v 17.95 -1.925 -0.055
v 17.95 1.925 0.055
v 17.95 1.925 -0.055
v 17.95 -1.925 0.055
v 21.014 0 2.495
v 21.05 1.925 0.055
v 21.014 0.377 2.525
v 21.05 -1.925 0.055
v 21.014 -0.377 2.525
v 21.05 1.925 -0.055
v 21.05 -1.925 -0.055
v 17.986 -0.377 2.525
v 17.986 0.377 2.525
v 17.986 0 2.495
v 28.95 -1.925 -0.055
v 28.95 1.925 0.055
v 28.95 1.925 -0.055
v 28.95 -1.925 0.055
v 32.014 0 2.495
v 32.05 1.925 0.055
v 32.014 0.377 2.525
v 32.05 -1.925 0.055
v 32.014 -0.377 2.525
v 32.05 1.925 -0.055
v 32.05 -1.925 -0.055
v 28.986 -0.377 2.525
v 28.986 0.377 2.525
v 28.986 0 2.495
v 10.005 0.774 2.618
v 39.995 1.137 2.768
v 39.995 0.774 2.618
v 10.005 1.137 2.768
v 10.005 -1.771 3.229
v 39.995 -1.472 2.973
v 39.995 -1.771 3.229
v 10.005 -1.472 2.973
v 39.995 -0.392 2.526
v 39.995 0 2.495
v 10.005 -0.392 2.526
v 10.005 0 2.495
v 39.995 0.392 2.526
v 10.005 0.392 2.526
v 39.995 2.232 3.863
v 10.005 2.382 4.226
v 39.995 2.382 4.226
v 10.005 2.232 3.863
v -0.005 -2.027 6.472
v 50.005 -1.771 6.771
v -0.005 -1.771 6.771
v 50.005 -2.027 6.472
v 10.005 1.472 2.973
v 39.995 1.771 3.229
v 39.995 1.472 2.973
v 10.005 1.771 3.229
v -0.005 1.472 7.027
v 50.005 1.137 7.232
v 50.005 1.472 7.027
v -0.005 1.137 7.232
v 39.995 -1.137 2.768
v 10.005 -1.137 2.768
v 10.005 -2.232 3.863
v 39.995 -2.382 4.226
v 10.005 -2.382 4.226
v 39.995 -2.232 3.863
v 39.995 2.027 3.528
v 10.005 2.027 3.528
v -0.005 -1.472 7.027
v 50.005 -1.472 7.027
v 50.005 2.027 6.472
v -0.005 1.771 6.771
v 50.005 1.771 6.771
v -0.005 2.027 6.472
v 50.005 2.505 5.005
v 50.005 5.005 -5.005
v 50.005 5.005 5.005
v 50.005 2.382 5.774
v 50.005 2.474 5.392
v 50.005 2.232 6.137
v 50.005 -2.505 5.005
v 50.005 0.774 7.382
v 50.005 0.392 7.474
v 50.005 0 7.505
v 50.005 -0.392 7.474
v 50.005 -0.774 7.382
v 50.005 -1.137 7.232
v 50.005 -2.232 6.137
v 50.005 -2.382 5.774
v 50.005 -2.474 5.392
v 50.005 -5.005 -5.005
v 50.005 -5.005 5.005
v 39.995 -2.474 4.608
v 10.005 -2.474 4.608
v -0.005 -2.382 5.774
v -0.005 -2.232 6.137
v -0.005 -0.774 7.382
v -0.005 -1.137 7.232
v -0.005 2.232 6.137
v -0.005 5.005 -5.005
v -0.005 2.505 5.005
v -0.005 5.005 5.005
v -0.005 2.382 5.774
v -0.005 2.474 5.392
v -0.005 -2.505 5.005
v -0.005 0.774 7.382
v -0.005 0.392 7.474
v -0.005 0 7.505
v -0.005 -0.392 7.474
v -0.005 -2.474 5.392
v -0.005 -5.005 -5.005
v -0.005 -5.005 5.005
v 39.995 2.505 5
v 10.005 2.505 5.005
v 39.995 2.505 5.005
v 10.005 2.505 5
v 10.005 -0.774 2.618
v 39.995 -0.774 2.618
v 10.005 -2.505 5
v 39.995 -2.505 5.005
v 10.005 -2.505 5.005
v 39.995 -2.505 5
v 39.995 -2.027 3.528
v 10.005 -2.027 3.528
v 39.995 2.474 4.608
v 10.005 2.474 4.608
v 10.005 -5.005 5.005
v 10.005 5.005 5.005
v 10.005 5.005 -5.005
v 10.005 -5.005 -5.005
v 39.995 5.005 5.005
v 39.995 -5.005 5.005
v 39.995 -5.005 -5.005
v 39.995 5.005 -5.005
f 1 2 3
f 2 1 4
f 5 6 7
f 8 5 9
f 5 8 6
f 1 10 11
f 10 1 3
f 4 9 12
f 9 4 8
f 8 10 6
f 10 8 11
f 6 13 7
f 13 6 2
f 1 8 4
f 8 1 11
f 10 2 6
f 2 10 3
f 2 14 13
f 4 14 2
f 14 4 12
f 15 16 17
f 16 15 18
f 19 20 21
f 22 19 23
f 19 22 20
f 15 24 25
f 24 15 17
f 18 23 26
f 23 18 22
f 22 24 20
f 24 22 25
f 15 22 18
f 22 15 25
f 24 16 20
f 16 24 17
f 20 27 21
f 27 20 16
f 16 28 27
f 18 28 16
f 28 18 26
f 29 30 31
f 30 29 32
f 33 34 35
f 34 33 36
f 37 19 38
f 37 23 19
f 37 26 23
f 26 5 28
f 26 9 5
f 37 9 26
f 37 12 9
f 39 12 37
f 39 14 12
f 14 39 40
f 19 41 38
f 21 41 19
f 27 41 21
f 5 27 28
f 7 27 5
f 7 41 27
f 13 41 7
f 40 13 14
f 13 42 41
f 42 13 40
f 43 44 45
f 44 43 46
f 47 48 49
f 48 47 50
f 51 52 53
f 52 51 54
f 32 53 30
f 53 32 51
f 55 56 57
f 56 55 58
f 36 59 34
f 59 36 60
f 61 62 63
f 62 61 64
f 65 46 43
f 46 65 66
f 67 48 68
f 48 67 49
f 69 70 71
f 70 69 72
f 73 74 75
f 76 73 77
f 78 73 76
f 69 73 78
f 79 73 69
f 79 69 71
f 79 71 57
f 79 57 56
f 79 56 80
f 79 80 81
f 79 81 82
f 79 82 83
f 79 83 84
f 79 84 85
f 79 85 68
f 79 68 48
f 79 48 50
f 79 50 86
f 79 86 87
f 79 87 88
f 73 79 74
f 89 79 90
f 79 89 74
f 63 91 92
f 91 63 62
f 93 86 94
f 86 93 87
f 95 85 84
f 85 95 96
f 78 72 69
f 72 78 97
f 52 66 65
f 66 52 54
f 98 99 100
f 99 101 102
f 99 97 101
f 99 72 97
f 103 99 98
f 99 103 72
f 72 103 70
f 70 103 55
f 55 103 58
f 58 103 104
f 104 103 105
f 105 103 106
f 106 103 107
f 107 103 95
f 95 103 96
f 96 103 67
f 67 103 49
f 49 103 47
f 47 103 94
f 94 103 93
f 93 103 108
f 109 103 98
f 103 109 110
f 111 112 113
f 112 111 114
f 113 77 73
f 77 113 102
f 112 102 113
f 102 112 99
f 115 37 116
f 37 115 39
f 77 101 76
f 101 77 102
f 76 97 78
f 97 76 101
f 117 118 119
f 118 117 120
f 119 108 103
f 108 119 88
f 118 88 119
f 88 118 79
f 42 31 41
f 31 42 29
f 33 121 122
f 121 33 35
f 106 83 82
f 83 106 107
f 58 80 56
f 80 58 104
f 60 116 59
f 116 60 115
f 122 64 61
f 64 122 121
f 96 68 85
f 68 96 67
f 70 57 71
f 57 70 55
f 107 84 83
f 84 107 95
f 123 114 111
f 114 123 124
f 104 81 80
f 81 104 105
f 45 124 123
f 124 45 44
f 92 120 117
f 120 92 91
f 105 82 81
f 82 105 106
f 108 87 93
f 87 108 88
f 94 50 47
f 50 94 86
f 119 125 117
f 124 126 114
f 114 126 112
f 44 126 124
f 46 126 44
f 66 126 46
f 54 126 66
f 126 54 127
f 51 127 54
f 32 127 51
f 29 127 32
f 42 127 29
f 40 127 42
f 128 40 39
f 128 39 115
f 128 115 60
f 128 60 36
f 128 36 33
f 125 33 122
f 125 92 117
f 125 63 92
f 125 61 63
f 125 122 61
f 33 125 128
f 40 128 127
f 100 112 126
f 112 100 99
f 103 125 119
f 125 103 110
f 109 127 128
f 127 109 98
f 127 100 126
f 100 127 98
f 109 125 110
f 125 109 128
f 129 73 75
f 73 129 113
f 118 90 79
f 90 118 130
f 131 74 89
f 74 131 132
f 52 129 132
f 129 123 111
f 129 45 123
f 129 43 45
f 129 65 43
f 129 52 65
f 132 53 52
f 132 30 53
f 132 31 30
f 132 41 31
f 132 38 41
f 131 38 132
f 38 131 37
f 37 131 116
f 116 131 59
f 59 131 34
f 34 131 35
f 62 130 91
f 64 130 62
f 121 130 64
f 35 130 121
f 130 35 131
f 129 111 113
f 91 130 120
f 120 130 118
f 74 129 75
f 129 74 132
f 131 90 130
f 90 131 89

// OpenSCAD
// file: vector_operations.scad
/*

    Make up for the lack of common vector operations.

    Usage:

        use <vector_operations.scad>

*/

module end_of_customization() {}

show_name = false;
if (show_name) {
    linear_extrude(2) text("vector_operations.scad", halign="center");
}

function quicksort(arr) = !(len(arr)>0) ? [] : let(
    pivot   = arr[floor(len(arr)/2)],
    lesser  = [ for (y = arr) if (y  < pivot) y ],
    equal   = [ for (y = arr) if (y == pivot) y ],
    greater = [ for (y = arr) if (y  > pivot) y ]
) concat(
    quicksort(lesser), equal, quicksort(greater)
);

// Cumulative sum of values in v
function v_cumsum(v) = [for (a = v[0]-v[0], i = 0; i < len(v); a = a+v[i], i = i+1) a+v[i]];
    
function v_sum(v, i=0, r=0) = i<len(v) ? v_sum(v, i+1, r+v[i]) : r;

function v_add_scalar(v, s) = [ for (e = v) e + s ];
    
function v_sub_scalar(v, s) = [ for (e = v) e - s ];
    
function v_mul_scalar(v, s) = [ for (e = v) e * s ];

function v_set(v) = let(sv = quicksort(v)) [for (i = [0: 1 : len(v)-1 ]) if (i == 0) sv[i] else if (sv[i] != sv[i-1]) sv[i]];

function v_shorten(v, places) = [ for (idx = [0 : 1: places-1]) v[idx]];

// The add operation is reasonably as the + operator in the language itself. 
 

function a2_add_scalar(a, s) = [ for (ae = a) v_add_scalar(ae, s) ];

// Array should be rectangular, with the same number
// of elements in each contained list.  
// That makes it different from a generic C style lists of list.
function array_transpose(a) = 
    [ for (j = [0 : 1 : len(a[0])-1]) 
        [ for (i =[0 : 1 : len(a)-1])
          a[i][j]  
        ]
    ];
        
        
module test_array_transpose() {
    a = [["cat1", "dog1"],
         ["cat2", "dog2"]]; 
    * echo("a", a);
    * echo("aT", array_transpose(a));
}

* test_array_transpose();

//Hadamard Product - - a & b must be same dimensioon
function v_o_dot(v_a, v_b) = 
    assert(len(v_a) == len(v_b), str("len(v_a)=", len(v_a), "len(v_b)=", len(v_b)))
    [ for (i = [0 : len(v_a)-1]) v_a[i] * v_b[i] ];


         
// file: centerable.scad
use <vector_operations.scad>


function bw_lshift(number, places) = 
    number * pow(2, places);
    
function bw_rshift(number, places) = 
    floor(number / pow(2, places));
    
function bw_extract(number, places, bits) = 
    bw_rshift(number, places) % pow(2, bits);

// A bit less brain-damaged primative shapes

CENTER = 0;   
PLUS = 1;
MINUS = 2;

FRONT = 1;
BEHIND = 2; 
RIGHT = 4;
LEFT =  8;    
ABOVE = 16;
BELOW = 32;
SIDEWISE = 64;

_X_BITS = [0, 2];
_Y_BITS = [2, 2];
_Z_BITS = [4, 2];
_O_BITS = [6, 1];

_XYZO_BITMAP = [_X_BITS, _Y_BITS, _Z_BITS, _O_BITS];

function _number_to_bitvector(number) = [ 
    for (i = [0:3]) let(places = _XYZO_BITMAP[i][0], bits = _XYZO_BITMAP[i][1]) 
       bw_extract(number, places, bits) 
];
    

function _bv_to_sign(bv) = [
    for (i = [0:len(bv)]) 
        bv[i] == PLUS ? 1 :
        bv[i] == MINUS ? -1 : 0
];
    

function _center_to_dv(center, s, bv) = [
    for (i = [0:len(s)-1]) s[i] * bv[i]
];
    
function _center_to_displacement(center, size) = 
    _center_to_dv(
        center, 
        v_mul_scalar(size, 0.5),
        _bv_to_sign(_number_to_bitvector(center))); 

function _rotation_to_angles(angles) = 
    let(
         bv = v_shorten(_number_to_bitvector(angles), 3),
         signs = _bv_to_sign(bv),
         // signs = [FRONT|BEHIND, RIGHT|LEFT, ABOVE|BELOW]
         // A sign of zero for FRONT|BEHIND is treated as FRONT
         rotation = 
            [0, 0, signs[0] == 1 ? 0 :  signs[0] == -1 ? 180: 0] + 
            v_mul_scalar([0, 0, 90], signs[1]) + 
            v_mul_scalar([0, -90, 0], signs[2])
    )
    rotation;

module center_translation(size, center) {
    disp = _center_to_displacement(center, size);
    translate(disp) { 
        children();
    }
}

module center_rotation(rotation) {
    angles = _rotation_to_angles(rotation);
    rotate(angles) {
        children();
    }

}


module center_reflect(v) {
    assert(!is_undef(v), "You must pass an mirroring argument to center_reflect()");
    children();
    mirror(v) children();
}
  
// main file
/*

    The shapes are slightly oversized, and the placement adjusted
    so that two shapes placed next to each other will have 
    non-adjacent faces. Shaped can be ranked, so that if the
    overlap, it is definite which will win the z-ordering fight.

    This is an attempt to make the epsilon  
*/



include <centerable.scad>

/* [Boiler Plate] */

$fa = 1;
$fs = 0.4;
eps = 0.005;
infintesimal = 0.01;

/* [Visual Tests] */

show_test_rod_all_octants = false;
show_test_rod_rod_single_attribute = false;
show_visual_test_for_crank = false;
show_visual_test_for_rod_support = true;
 

// h_by_one_hundred = 1; // [0 : 1 : 99.9]
// echo("h_by_one_hundred", h_by_one_hundred);
__l = 50; // [0 : 1 : 99.9]
//echo(__l);
__x_start = 10; // [0 : 1 : 99.9]
__x_stop = 40; // [0 : 1 : 99.9]
__support_end_start  = true;
__support_end_stop  = true;
__ends_supported = [__support_end_start, __support_end_stop];
/* 
    Block is a cube with a specific translation about the origin.

    
    Example usage:
    
    size = [10, 2, 6];
    cuboid(size); // Centered on X, Y, & Z axises
    
    block(size, center=ABOVE); // Centered on X, Y axises
    block(size, center=ABOVE+FRONT); // Centered on X
    block(size, center=ABOVE+FRONT+LEFT); // One corner is at origin
    
*/
module block(size, center=0, rank=1) { 
    function swell(w=0) = w + 2*rank*eps;
    true_size = size + [swell(0), swell(0), swell(0)];
    disp = _center_to_displacement(center, size);
    translate(disp) cube(true_size, center=true);  
}



/*
    Rod is a cylinder on its edge, with a specific translation 
    about the origin and orientation.

    Example usage:

    rod(d=10, l=20, center = FRONT);
    rod(d=10, l=20, center = SIDEWISE + FRONT + ABOVE + LEFT);

*/

module rod(d, l, center=0, hollow=false, rank=1, fa=undef) {
    function swell(w=0) = w + 2*rank*eps;
    function swell_inward(w=0) = w - 2*rank*eps;  
    $fa = is_undef(fa) ? $fa : fa;
    bv = _number_to_bitvector(center);
    is_sideways = bv[3] == 1;
    x = is_sideways ? d : l;
    y = is_sideways ? l : d;
    z = d;
    size=[x, y, z];
    disp = _center_to_displacement(center, size);
    a = is_sideways ? 90 : 0;


    translate(disp) {
        rotate([0, 0, a])
        rotate([0, 90, 0])
        if (hollow == false) {
            cylinder(d=swell(d), h=swell(l), center=true);
        } else if (is_num(hollow)) {
            render() difference() {
                cylinder(d=swell(d), h=swell(l), center=true);
                cylinder(d=swell_inward(hollow), h=2*l, center=true);  
            }
        } else {
            assert(false, str("Don't know how to handle hollow=", hollow));
        } 
    }   
}

/*
    Can  is a cylinder on its end, with a specific translation 
    about the origin.
    
*/
module can(d,h, center=0, hollow=false, taper=false, rank=1, fa=undef) {
    function swell(w=0) = w + 2*rank*eps;
    function swell_inward(w=0) = w - 2*rank*eps; 
    $fa = is_undef(fa) ? $fa : fa;
    bv = _number_to_bitvector(center);
    size = [d, d, h];
    disp = _center_to_displacement(center, size);
    translate(disp) {
        if (hollow == false) {
            if (taper == false) {
                cylinder(d=swell(d), h=swell(h), center=true); 
            } else if (is_num(taper)) {
                cylinder(d1=swell(d), d2=swell(taper), h=swell(h), center=true);
            } else {
                assert(false, str("Don't know how to handle taper=", taper));
            }
        } else if (is_num(hollow)) {
            if (taper == false) {
                render() difference() {
                    cylinder(d=swell(d), h=swell(h), center=true);
                    cylinder(d=swell_inward(hollow), h=2*h, center=true);
                }
            } else {
                assert(false, "Not implemented - hollow tapered.");
            }
        } else {
            assert(false, str("Don't know how to handle hollow=", hollow));
        }  
    }  
}

module crank(size, hole=false, center=0, rotation=0, rank=1, fa=undef) {
    function swell(w=0) = w + 2*rank*eps;
    function swell_inward(w=0) = w - 2*rank*eps; 
    $fa = is_undef(fa) ? $fa : fa;
    hole_d = is_num(hole) ? hole : 0;
    pivot_size = [size.z, size.y, size.z];
    half_pivot = [swell(pivot_size.x/2),  swell(pivot_size.y), swell(pivot_size.z)];
    remainder =  [swell(size.x - pivot_size.x/2), swell(size.y), swell(size.z)];

    center_translation(pivot_size, center) {
        center_rotation(rotation) {
            render() difference() {
                union() {
                    block(half_pivot, center=FRONT);
                    rod(d=swell(size.z), l=swell(size.y), center=SIDEWISE);
                }
                rod(d=swell_inward(hole_d), l=2*size.y, center=SIDEWISE);
            }
            // Rest of block
            translate([pivot_size.x/2, 0, 0]) block(remainder, center=FRONT);
        }
    } 
}

module tearaway(
        support_locations, 
        d,
        l,
        z,
        center=0,
        radial_allowance=0.4, 
        overlap_multiplier=1.5,
        support_length=3) {
           
    x_offset = center==0 ? -l/2:
               center==FRONT ? 0:
               assert(false);
    z_p = z - d / 2;
    base = [support_length, 1.5*z_p, , infintesimal];
    neck = [support_length, infintesimal, infintesimal];
    z_neck = z_p + overlap_multiplier*radial_allowance;
    
    module tearaway_segment(ts_center) {
        hull() {
           block(base, center=ts_center, rank=10);
           translate([0, 0, z_neck]) block(neck, center=ts_center);
        }
    }
    for (support_location = support_locations) {
        dx = is_num(support_location) ? support_location : support_location[0];
        ts_center = is_num(support_location) ? center : support_location[1];
        translate([dx+x_offset, 0, 0]) tearaway_segment(ts_center);
    } 
} 

module _visual_test_for_crank() {

    translate([0, -80, 0]) crank([10, 4, 4], hole=2, center=BEHIND);

    translate([0, -70, 0]) crank([10, 4, 4], hole=2, center=FRONT);

    translate([0, -60, 0]) crank([10, 4, 4], hole=2, center=LEFT);

    translate([0, -50, 0]) crank([10, 4, 4], hole=2, center=RIGHT);

    translate([0, -40, 0]) crank([10, 4, 4], hole=2, center=ABOVE);

    translate([0, -30, 0]) crank([10, 4, 4], hole=2, center=BELOW);

    translate([0, -10, 0]) crank([10, 4, 4]);

    translate([0, 0, 0]) crank([10, 4, 4], hole=2);

    translate([0, 20, 0]) crank([10, 4, 4], hole=2, rotation=ABOVE);

    translate([0, 30, 0]) crank([10, 4, 4], hole=2, rotation=BELOW);

    translate([0, 40, 0]) crank([10, 4, 4], hole=2, rotation=FRONT);

    translate([0, 50, 0]) crank([10, 4, 4], hole=2, rotation=BEHIND);

    translate([0, 70, 0]) crank([10, 4, 4], hole=2, rotation=LEFT);

    translate([0, 80, 0]) crank([10, 4, 4], hole=2, rotation=RIGHT);

    translate([0, 100, 0]) crank([10, 4, 4], hole=2, rotation=ABOVE+RIGHT);
    
}

if (show_visual_test_for_crank) {
    _visual_test_for_crank();   
}


module _visual_test_rod_single_attribute(d, l, a) {
    
    color("SteelBlue", alpha = a) 
    rod(d=d, l=l, center=BEHIND); 

    color("FireBrick", alpha = a) 
    rod(d=d, l=l, center=FRONT);

    color("Lavender", alpha = a)   
    rod(d=d, l=l, center=LEFT);

    color("RosyBrown", alpha = a)        
    rod(d=d, l=l, center=RIGHT);

    color("Aqua", alpha = a)   
    rod(d=d, l=l, center=ABOVE);

    color("blue", alpha = a)        
    rod(d=d, l=l, center=BELOW);
}

if (show_test_rod_rod_single_attribute) {
    _visual_test_rod_single_attribute(10, 20, 0.5);
}

module _visual_test_all_octants(d, l, use_sideways, alpha) {
    colors = [
        [
            ["red", "orange"],
            ["yellow", "green"]
        ],
        [
            ["IndianRed", "LightSalmon"],
            ["Khaki", "LightGreen"]
        ]
    ];
    a_sideways = use_sideways ? SIDEWISE : 0;
    
    function i_x(x) = x == BEHIND ? 0 : 1;
    function i_y(y) = y == LEFT ? 0 : 1;
    function i_z(z) = z == ABOVE ? 0 : 1;
    
    function map_to_color(x, y, z) = colors[i_x(x)][i_y(y)][i_z(z)];
    for (x_a = [BEHIND, FRONT]) {
        for (y_a = [LEFT, RIGHT]) {
            for (z_a = [ABOVE, BELOW]) {
                color(map_to_color(x_a, y_a, z_a), alpha=alpha)        
                rod(d=d, l=l, center=x_a+y_a+z_a+a_sideways);                
            }
        }
    }
    
}

if (show_test_rod_all_octants) {
    _visual_test_all_octants(10, 20, false, 0.5);
}
        
function support_locations_for_segment(
        segment, 
        ends_supported = [true, true],
        support_length = 3, 
        max_bridge = 10) =
    let(
        segment_length = abs(segment[0] - segment[1]),
        n_end_bridges = (ends_supported[0] ? 1 : 0) + (ends_supported[1] ? 1 : 0),
        n_supports_fractional = 
            (segment_length - (n_end_bridges - 1) * max_bridge) / (support_length + max_bridge),
        n_supports = ceil(n_supports_fractional),
        n_bridges = n_supports + n_end_bridges - 1, 
        bridge = (segment_length - n_supports*support_length)/n_bridges,
        last = undef
    )
    echo("segment_length", segment_length)
    echo("n_end_bridges", n_end_bridges)
    echo("n_supports_fractional", n_supports_fractional)
    echo("n_supports", n_supports)
    echo("n_bridges", n_bridges)
    echo("bridge", bridge)
    assert(bridge <= max_bridge)
    [
        for (i = [0 : 1 : n_supports-1])  
            segment[0] 
            + (ends_supported[0] ? bridge: 0)
            + i * (support_length + bridge)
    ];

module _visual_test_for_rod_support() {
    z = 5;
    d = 5;
    l = __l;
    
    center=FRONT;
    translate([0, 0, z]) rod(d, l, center=center);
    support_locations = support_locations_for_segment(
        [__x_start, min(__x_stop, l)],
        ends_supported = __ends_supported);
    echo("support_locations", support_locations);
    tearaway(
        support_locations, 
        d, 
        l,
        z,
        center);
    
    
    color("red") block([__x_start, 10, 10], center=FRONT);
    color("blue") translate([__x_stop, 0, 0]) block([10, 10, 10], center=FRONT);
    
} 

if (show_visual_test_for_rod_support) {
    _visual_test_for_rod_support();
}
